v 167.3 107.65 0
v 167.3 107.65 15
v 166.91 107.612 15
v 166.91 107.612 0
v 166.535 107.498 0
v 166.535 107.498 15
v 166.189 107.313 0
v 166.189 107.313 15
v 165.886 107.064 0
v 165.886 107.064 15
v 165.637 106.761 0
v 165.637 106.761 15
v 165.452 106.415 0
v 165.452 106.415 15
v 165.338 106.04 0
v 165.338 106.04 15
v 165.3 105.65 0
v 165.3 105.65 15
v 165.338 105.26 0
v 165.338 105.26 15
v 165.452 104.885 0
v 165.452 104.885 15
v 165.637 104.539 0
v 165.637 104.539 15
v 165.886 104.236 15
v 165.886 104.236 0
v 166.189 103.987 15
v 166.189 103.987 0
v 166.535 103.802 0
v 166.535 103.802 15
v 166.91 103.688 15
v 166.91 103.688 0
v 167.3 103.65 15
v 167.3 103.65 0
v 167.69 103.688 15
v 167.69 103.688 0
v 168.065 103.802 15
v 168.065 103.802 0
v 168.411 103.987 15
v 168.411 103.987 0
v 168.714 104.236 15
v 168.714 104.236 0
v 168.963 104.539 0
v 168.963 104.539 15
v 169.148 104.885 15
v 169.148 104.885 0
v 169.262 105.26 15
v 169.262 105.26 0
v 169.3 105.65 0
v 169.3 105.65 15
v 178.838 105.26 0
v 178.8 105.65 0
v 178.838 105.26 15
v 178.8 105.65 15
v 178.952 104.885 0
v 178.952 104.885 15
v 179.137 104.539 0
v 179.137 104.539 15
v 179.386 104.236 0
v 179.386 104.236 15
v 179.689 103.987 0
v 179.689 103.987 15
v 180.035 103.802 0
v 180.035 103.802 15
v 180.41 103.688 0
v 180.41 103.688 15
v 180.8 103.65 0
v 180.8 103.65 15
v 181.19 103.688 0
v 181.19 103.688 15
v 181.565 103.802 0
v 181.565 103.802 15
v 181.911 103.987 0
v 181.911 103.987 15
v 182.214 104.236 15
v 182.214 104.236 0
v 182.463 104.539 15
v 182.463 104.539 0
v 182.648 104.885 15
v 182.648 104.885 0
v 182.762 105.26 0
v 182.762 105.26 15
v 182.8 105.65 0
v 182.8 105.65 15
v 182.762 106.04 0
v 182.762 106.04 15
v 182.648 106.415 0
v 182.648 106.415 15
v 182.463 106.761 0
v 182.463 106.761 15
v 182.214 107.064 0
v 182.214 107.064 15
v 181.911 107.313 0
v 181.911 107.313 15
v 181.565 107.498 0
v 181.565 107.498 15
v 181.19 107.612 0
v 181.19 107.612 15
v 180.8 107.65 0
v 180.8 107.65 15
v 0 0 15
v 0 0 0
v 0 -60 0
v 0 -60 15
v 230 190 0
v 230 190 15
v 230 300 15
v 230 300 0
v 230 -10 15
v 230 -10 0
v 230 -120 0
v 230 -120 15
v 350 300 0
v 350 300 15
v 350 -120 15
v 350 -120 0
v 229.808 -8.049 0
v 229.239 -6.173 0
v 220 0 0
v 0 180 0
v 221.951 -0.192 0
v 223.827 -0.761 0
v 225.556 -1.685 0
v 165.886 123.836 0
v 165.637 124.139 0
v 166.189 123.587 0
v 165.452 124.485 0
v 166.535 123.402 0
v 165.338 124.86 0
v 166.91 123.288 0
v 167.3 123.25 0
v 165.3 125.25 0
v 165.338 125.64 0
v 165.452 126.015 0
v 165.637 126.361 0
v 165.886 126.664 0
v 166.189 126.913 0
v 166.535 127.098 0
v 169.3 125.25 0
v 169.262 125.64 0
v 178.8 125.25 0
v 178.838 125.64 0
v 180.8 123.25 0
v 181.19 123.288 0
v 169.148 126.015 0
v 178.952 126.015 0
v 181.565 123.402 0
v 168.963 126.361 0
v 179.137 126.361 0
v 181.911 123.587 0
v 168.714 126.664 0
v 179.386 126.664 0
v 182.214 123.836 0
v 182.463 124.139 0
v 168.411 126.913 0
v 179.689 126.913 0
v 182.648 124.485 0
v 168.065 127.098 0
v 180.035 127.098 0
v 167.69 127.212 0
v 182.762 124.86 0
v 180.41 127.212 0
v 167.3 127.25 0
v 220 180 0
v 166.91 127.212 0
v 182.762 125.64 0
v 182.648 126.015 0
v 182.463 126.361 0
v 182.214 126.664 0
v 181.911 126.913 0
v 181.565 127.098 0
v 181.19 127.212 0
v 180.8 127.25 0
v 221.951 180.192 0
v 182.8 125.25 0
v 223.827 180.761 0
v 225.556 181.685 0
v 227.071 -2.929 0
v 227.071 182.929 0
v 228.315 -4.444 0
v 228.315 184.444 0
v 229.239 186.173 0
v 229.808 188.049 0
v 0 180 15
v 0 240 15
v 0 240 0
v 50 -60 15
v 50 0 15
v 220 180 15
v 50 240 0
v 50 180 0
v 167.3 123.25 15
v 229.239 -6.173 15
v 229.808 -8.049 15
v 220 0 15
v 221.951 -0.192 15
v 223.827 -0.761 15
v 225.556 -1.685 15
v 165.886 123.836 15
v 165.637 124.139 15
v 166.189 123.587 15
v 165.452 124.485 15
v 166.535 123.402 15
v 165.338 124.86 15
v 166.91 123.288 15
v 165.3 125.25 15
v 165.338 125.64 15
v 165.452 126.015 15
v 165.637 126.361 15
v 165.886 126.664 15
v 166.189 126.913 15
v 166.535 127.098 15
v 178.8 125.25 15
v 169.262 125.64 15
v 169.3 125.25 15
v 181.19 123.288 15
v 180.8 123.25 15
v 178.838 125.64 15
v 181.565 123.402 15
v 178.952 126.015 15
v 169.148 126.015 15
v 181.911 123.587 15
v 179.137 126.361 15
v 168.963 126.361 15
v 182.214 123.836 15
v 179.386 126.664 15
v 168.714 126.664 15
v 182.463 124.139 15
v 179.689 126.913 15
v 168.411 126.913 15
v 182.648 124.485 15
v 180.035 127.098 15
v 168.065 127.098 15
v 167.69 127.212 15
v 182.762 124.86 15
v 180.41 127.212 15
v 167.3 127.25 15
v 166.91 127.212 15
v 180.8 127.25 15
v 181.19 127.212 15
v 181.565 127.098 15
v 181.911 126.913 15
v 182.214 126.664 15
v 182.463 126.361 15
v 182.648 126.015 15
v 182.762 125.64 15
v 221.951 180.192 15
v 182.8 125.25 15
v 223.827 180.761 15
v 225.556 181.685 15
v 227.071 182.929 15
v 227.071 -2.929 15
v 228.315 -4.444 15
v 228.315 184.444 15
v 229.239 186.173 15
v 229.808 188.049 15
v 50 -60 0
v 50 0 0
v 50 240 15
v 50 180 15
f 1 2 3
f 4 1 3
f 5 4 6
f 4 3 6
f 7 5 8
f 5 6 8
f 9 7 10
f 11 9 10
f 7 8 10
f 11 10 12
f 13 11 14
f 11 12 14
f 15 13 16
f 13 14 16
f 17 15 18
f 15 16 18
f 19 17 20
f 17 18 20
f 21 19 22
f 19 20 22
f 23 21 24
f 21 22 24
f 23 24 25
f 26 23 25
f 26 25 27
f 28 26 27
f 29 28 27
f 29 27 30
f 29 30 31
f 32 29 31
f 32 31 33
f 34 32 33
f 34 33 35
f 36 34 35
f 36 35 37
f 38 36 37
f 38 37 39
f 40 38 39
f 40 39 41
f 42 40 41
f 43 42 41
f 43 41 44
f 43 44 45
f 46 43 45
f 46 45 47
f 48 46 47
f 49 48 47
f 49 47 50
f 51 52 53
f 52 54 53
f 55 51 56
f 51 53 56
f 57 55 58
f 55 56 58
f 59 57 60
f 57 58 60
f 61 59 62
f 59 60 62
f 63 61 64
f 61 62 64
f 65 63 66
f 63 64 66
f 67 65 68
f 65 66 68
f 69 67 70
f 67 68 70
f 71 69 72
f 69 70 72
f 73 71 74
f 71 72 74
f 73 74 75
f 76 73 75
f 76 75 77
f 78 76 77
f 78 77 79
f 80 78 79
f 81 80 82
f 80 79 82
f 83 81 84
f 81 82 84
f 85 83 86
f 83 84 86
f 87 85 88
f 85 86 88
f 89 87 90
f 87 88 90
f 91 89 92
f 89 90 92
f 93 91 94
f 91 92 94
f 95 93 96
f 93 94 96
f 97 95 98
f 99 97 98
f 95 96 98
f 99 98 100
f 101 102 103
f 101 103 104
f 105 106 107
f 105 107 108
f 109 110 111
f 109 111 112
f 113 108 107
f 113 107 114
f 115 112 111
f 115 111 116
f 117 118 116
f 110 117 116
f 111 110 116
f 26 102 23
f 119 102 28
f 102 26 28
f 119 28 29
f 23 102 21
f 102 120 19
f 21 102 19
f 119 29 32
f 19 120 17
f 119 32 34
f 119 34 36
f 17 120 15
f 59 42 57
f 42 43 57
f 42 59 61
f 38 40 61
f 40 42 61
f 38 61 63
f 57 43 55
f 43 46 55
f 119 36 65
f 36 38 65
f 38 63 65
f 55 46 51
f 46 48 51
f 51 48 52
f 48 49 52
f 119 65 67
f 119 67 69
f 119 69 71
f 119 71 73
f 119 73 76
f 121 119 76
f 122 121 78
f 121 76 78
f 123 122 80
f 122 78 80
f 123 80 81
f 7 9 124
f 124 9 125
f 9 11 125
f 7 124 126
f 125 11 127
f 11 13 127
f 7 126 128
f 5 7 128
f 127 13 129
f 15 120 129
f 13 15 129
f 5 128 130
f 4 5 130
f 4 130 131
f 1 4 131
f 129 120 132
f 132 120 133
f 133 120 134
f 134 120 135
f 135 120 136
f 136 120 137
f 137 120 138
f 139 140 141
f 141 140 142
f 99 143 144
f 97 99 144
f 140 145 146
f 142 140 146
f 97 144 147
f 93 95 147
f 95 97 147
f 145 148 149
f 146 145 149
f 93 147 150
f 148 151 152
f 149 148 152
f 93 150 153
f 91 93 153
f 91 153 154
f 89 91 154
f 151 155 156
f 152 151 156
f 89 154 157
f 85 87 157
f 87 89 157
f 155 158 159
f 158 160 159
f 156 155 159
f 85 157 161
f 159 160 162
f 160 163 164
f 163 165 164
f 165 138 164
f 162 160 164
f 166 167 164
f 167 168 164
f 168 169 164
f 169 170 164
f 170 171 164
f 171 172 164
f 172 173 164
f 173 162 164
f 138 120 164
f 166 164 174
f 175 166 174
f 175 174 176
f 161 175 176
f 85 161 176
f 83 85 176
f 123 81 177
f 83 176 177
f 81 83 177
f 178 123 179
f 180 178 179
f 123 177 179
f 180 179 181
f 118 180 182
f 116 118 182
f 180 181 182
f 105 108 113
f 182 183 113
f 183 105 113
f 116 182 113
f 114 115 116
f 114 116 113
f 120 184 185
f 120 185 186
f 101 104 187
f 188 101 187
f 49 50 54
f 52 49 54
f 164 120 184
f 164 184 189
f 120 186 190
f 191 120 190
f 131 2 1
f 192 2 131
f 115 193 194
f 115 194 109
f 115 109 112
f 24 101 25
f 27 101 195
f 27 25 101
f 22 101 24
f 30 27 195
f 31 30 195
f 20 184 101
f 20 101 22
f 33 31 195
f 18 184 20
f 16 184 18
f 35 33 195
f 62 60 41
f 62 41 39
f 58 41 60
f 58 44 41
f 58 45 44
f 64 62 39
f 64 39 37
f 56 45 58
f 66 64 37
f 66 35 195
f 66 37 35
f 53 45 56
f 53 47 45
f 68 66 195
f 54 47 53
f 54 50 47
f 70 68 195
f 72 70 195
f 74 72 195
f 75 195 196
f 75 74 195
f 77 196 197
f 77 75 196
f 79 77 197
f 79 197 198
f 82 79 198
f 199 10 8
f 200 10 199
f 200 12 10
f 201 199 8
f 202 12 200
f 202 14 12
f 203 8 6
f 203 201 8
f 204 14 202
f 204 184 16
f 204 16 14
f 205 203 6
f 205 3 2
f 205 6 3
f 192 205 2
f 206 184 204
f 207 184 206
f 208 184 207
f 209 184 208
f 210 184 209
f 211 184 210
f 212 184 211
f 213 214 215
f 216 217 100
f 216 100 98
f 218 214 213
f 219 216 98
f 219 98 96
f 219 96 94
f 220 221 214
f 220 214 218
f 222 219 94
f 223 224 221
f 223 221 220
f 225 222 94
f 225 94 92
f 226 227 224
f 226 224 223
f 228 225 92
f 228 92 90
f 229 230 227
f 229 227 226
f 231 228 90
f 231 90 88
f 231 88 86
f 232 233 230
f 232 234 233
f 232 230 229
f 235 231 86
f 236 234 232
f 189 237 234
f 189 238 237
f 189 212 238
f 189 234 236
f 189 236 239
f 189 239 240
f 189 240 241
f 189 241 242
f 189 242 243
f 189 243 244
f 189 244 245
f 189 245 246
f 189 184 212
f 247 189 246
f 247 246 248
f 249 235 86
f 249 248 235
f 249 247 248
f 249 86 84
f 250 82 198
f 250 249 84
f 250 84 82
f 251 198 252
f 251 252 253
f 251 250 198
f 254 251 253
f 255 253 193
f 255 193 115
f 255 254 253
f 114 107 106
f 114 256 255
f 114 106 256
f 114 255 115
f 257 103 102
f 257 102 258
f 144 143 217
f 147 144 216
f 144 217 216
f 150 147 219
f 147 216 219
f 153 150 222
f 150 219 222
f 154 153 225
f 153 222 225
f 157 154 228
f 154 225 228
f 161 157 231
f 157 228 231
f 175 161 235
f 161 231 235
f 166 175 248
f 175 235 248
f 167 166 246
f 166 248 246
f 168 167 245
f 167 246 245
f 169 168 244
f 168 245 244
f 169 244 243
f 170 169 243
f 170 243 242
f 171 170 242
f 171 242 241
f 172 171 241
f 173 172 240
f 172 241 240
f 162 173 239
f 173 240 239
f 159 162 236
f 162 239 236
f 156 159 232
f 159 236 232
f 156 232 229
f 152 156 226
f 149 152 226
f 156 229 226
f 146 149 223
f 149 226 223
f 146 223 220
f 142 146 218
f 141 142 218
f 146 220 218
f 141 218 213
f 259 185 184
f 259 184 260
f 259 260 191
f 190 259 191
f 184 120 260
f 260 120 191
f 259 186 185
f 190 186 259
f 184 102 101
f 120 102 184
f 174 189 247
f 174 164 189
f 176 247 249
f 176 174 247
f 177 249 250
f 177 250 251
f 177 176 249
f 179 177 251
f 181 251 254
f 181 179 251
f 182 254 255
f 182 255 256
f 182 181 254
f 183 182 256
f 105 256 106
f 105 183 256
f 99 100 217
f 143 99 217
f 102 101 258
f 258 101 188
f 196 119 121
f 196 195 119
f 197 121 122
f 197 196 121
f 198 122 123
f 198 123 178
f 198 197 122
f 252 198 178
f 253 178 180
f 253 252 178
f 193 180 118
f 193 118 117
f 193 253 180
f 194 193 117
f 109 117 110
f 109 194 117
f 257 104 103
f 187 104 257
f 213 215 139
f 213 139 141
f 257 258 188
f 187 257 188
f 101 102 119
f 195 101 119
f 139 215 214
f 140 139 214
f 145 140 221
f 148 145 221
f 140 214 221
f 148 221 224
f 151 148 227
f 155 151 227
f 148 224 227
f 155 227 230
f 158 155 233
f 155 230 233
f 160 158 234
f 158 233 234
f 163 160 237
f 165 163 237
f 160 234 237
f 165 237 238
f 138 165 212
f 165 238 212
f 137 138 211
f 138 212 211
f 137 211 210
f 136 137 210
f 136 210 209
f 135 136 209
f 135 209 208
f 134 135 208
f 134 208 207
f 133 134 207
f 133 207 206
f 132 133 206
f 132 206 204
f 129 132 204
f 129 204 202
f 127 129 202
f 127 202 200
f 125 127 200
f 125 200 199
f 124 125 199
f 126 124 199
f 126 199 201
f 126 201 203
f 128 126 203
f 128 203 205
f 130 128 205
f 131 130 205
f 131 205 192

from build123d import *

# Parameters (mm, degrees)
SKETCH_1_W          = 400
SKETCH_1_H          = 180
EXTRUDE_1_DEPTH     = 15
SKETCH_3_W          = 9.5
SKETCH_3_H          = 15.6
CUT_EXTRUDE_2_DEPTH = 439.890646973
SKETCH_4_W          = 13.5
SKETCH_4_H          = 19.6
CUT_EXTRUDE_3_DEPTH = 439.890646973
SKETCH_5_R          = 2
CUT_EXTRUDE_4_DEPTH = 439.890646973
SKETCH_6_W          = 100
SKETCH_6_H          = 15
EXTRUDE_2_DEPTH     = 120
SKETCH_7_W          = 100
SKETCH_7_H          = 15
EXTRUDE_3_DEPTH     = 120
FILLET_1_R          = 10
SKETCH_8_W          = 50
SKETCH_8_H          = 180
CUT_EXTRUDE_5_DEPTH = 120
FILLET_2_R          = 10
SKETCH_9_W          = 50
SKETCH_9_H          = 15
EXTRUDE_4_DEPTH     = 60
SKETCH_10_W         = 50
SKETCH_10_H         = 15
EXTRUDE_5_DEPTH     = 60
SKETCH_11_W         = 20
SKETCH_11_H         = 120
EXTRUDE_6_DEPTH     = 15


with BuildPart() as part:
    # 草图1 → 凸台-拉伸1 (new body)
    with BuildSketch(Plane.XY):
        with Locations((200, 90)):
            Rectangle(SKETCH_1_W, SKETCH_1_H)
    extrude(amount=EXTRUDE_1_DEPTH)

    # 草图3 → 切除-拉伸2 (cut, through all)
    with BuildSketch(Plane.XY.offset(15)):
        with Locations((174.05, 115.45)):
            Rectangle(SKETCH_3_W, SKETCH_3_H)
    extrude(amount=-CUT_EXTRUDE_2_DEPTH, mode=Mode.SUBTRACT)

    # 草图4 → 切除-拉伸3 (cut, through all)
    with BuildSketch(Plane.XY.offset(15)):
        with Locations((174.05, 115.45)):
            Rectangle(SKETCH_4_W, SKETCH_4_H)
    extrude(amount=-CUT_EXTRUDE_3_DEPTH, mode=Mode.SUBTRACT)

    # 草图5 → 切除-拉伸4 (cut, through all)
    with BuildSketch(Plane.XY.offset(15)):
        with Locations((167.3, 125.25)):
            Circle(SKETCH_5_R)
        with Locations((167.3, 105.65)):
            Circle(SKETCH_5_R)
        with Locations((180.8, 105.65)):
            Circle(SKETCH_5_R)
        with Locations((180.8, 125.25)):
            Circle(SKETCH_5_R)
    extrude(amount=-CUT_EXTRUDE_4_DEPTH, mode=Mode.SUBTRACT)

    # 草图6 → 凸台-拉伸2 (add)
    with BuildSketch(Plane(origin=(0, 180, 0), x_dir=(1, 0, 0), z_dir=(0, 1, 0))):
        with Locations((280, -7.5)):
            Rectangle(SKETCH_6_W, SKETCH_6_H)
    extrude(amount=EXTRUDE_2_DEPTH)

    # 草图7 → 凸台-拉伸3 (add)
    with BuildSketch(Plane.XZ):
        with Locations((280, 7.5)):
            Rectangle(SKETCH_7_W, SKETCH_7_H)
    extrude(amount=EXTRUDE_3_DEPTH)

    # 圆角1
    fillet_1_edges = [part.edges().sort_by_distance(p)[0] for p in [
        (230, 0, 7.5),
        (230, 180, 7.5),
    ]]
    fillet(fillet_1_edges, radius=FILLET_1_R)

    # 草图8 → 切除-拉伸5 (cut)
    with BuildSketch(Plane.XY.offset(15)):
        with Locations((375, 90)):
            Rectangle(SKETCH_8_W, SKETCH_8_H)
    extrude(amount=-CUT_EXTRUDE_5_DEPTH, mode=Mode.SUBTRACT)

    # 圆角2
    fillet_2_edges = [part.edges().sort_by_distance(p)[0] for p in [
        (330, 0, 7.5),
        (330, 180, 7.5),
    ]]
    fillet(fillet_2_edges, radius=FILLET_2_R)

    # 草图11 → 凸台-拉伸6 (add)
    with BuildSketch(Plane.XY.offset(15)):
        with Locations((340, -60)):
            Rectangle(SKETCH_11_W, SKETCH_11_H)
        with Locations((340, 240)):
            Rectangle(SKETCH_11_W, SKETCH_11_H)
    extrude(amount=-EXTRUDE_6_DEPTH)


with BuildPart() as body_2:
    # 草图9 → 凸台-拉伸4 (new body)
    with BuildSketch(Plane(origin=(0, 180, 0), x_dir=(1, 0, 0), z_dir=(0, 1, 0))):
        with Locations((25, -7.5)):
            Rectangle(SKETCH_9_W, SKETCH_9_H)
    extrude(amount=EXTRUDE_4_DEPTH)


with BuildPart() as body_3:
    # 草图10 → 凸台-拉伸5 (new body)
    with BuildSketch(Plane.XZ):
        with Locations((25, 7.5)):
            Rectangle(SKETCH_10_W, SKETCH_10_H)
    extrude(amount=EXTRUDE_5_DEPTH)


solid = Compound([part.part, body_2.part, body_3.part])
